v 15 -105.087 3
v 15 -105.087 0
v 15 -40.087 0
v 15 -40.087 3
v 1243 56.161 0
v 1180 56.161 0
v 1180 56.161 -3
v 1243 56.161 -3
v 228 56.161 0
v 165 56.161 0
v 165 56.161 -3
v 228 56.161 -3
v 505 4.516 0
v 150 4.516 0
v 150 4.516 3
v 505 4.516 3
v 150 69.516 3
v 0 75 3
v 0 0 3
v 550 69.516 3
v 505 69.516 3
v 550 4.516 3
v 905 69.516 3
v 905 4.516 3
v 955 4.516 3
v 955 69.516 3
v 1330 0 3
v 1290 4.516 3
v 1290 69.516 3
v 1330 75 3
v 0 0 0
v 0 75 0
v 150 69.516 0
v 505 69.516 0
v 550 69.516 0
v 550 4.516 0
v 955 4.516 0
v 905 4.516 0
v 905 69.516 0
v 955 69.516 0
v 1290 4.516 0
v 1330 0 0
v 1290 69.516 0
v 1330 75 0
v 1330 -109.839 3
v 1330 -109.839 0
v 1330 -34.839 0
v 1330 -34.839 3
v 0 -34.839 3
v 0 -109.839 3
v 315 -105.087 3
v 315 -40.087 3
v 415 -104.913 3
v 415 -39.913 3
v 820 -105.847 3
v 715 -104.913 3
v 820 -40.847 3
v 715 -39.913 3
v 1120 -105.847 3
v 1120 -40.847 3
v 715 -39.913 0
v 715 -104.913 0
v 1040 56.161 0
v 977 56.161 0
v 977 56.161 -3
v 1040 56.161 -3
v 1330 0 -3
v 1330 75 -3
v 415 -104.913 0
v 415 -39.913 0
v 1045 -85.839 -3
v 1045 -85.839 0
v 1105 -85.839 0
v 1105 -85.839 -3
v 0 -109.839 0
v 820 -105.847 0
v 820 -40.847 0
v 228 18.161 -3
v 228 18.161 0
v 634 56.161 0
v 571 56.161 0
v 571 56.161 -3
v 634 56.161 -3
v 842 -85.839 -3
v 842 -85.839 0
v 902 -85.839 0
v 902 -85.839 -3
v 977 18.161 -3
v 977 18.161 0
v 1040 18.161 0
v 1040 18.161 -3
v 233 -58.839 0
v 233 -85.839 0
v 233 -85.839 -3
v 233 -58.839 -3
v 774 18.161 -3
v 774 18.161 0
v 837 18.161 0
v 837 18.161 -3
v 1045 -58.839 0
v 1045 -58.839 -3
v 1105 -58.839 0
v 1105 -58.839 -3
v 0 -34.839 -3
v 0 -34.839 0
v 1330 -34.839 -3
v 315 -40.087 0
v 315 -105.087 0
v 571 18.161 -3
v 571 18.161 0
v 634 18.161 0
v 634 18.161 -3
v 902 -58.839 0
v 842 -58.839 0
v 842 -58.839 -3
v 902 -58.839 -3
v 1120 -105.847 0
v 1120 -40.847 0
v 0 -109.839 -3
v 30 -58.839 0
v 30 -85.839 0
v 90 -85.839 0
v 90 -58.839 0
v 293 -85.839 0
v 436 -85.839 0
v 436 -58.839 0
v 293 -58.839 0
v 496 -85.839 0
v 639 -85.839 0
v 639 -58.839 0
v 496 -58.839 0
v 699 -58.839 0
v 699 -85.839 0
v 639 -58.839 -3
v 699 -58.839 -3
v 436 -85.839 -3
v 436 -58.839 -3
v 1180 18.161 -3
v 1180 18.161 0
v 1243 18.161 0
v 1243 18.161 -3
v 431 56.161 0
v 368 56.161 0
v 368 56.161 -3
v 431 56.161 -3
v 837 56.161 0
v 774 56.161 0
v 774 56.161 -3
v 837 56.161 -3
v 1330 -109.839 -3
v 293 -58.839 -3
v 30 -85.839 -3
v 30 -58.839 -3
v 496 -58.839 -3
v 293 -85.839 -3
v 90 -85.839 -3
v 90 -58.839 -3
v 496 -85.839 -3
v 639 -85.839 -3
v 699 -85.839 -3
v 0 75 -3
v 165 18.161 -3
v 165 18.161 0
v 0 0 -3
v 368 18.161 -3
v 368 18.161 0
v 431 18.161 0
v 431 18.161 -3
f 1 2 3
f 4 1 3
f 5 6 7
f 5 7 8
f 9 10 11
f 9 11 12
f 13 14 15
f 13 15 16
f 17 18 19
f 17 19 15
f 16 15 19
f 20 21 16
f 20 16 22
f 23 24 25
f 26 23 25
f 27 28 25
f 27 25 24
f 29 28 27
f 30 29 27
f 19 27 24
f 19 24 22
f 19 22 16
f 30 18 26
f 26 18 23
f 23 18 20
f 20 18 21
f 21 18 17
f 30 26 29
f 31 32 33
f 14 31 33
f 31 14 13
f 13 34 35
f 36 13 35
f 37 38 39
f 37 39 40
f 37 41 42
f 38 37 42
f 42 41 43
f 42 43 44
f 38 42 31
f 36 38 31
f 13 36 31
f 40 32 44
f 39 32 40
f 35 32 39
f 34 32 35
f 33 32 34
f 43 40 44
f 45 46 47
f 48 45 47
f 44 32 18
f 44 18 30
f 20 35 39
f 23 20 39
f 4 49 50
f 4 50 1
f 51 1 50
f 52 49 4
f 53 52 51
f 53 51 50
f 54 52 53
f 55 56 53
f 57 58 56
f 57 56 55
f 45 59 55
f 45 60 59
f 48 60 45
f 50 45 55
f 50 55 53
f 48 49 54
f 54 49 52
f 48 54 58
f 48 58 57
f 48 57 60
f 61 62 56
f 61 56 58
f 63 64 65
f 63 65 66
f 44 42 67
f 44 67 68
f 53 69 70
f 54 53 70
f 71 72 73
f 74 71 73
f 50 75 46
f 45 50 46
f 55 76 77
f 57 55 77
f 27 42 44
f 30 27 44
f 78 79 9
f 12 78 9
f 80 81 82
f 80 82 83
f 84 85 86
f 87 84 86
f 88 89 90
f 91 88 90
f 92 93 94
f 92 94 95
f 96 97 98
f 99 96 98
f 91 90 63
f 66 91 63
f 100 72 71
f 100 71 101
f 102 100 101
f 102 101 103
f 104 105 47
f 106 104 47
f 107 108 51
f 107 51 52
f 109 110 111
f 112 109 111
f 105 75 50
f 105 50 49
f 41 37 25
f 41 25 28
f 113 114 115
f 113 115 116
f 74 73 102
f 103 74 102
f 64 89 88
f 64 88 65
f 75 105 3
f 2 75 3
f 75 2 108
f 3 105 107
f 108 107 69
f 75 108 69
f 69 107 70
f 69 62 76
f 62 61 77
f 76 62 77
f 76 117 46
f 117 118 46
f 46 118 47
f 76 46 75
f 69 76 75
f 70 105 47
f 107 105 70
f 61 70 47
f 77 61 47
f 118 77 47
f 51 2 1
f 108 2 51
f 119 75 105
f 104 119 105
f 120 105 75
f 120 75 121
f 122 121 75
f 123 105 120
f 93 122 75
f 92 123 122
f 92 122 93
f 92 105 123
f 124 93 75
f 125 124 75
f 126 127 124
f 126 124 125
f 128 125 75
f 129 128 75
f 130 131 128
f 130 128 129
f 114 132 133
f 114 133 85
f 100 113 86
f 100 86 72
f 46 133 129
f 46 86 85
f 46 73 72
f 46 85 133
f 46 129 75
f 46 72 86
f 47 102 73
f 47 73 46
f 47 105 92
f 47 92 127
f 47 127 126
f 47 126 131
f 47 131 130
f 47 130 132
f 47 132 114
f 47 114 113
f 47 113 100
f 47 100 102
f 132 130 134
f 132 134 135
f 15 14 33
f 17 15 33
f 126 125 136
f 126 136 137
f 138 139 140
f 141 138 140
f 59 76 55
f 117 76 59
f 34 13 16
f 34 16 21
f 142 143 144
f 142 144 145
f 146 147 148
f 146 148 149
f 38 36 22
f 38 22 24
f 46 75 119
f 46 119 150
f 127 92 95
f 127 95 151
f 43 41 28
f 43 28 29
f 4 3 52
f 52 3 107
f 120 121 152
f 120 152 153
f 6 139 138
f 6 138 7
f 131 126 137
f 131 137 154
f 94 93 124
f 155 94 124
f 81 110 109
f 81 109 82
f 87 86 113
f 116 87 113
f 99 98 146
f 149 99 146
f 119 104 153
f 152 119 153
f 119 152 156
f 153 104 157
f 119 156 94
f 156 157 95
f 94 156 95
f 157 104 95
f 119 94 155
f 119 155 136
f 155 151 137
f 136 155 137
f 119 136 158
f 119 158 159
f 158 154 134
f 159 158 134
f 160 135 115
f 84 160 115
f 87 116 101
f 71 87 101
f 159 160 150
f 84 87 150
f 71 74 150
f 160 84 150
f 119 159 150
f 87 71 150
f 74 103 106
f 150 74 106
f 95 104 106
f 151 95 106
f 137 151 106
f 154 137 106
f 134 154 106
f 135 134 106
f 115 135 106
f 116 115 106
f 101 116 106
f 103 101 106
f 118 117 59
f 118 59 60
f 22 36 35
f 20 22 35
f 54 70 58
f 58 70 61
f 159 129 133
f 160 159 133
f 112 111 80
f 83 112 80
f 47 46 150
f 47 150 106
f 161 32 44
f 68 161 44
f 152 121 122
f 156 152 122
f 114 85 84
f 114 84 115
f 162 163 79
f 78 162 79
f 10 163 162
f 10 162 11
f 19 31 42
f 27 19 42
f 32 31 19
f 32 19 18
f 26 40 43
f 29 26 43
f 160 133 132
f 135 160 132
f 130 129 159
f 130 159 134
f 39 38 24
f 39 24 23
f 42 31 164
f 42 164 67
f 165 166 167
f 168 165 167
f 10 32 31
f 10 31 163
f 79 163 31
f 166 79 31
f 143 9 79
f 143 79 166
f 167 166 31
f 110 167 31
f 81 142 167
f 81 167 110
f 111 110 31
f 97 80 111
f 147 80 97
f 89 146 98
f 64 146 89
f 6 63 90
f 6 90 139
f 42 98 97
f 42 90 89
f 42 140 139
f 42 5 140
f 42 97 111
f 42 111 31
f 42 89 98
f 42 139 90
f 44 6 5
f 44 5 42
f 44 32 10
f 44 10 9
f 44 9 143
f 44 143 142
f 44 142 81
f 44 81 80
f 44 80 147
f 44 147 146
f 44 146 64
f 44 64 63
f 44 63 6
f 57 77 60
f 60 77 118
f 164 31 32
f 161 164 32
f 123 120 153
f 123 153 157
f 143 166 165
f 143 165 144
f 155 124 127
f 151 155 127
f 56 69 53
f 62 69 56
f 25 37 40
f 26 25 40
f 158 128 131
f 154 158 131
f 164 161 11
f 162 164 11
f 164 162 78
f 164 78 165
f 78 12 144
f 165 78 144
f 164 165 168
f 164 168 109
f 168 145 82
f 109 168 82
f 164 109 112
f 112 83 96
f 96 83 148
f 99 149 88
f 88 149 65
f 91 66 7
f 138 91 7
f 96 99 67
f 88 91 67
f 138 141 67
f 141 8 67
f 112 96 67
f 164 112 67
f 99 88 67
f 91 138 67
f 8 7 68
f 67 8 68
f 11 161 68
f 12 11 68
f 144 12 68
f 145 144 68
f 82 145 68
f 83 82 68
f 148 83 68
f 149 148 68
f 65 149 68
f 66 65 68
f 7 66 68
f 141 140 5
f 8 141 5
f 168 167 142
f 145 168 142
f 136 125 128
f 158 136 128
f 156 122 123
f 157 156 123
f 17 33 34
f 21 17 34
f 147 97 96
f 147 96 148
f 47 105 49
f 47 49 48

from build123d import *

# Parameters (mm, degrees)
F0_W     = 1330
F0_H     = 75
F0_W_2   = 355
F0_H_2   = 65
F0_W_3   = 335
F0_W_4   = 300
F2_DEPTH = 3
F1_W     = 1330
F1_H     = 75
F1_W_2   = 63
F1_H_2   = 38
F1_W_3   = 60
F1_H_3   = 27
F3_DEPTH = 3


with BuildPart() as f2:
    # F0 (on Top) → F2 (new body)
    with BuildSketch(Plane.XY):
        with Locations((665, 37.5)):
            Rectangle(F0_W, F0_H)
        with Locations((327.5, 37.015805)):
            Rectangle(F0_W_2, F0_H_2, mode=Mode.SUBTRACT)
        with Locations((727.5, 37.015794)):
            Rectangle(F0_W_2, F0_H_2, mode=Mode.SUBTRACT)
        with Locations((1122.5, 37.015812)):
            Rectangle(F0_W_3, F0_H_2, mode=Mode.SUBTRACT)
        with Locations((665, -72.338669)):
            Rectangle(F0_W, F0_H)
        with Locations((165, -72.586558)):
            Rectangle(F0_W_4, F0_H_2, mode=Mode.SUBTRACT)
        with Locations((565, -72.413251)):
            Rectangle(F0_W_4, F0_H_2, mode=Mode.SUBTRACT)
        with Locations((970, -73.346786)):
            Rectangle(F0_W_4, F0_H_2, mode=Mode.SUBTRACT)
    extrude(amount=F2_DEPTH)


with BuildPart() as f3:
    # F1 (on Top) → F3 (new body)
    with BuildSketch(Plane.XY):
        with Locations((665, 37.5)):
            Rectangle(F1_W, F1_H)
        with Locations((196.5, 37.161331)):
            Rectangle(F1_W_2, F1_H_2, mode=Mode.SUBTRACT)
        with Locations((399.5, 37.161331)):
            Rectangle(F1_W_2, F1_H_2, mode=Mode.SUBTRACT)
        with Locations((602.5, 37.161331)):
            Rectangle(F1_W_2, F1_H_2, mode=Mode.SUBTRACT)
        with Locations((805.5, 37.161331)):
            Rectangle(F1_W_2, F1_H_2, mode=Mode.SUBTRACT)
        with Locations((1008.5, 37.161331)):
            Rectangle(F1_W_2, F1_H_2, mode=Mode.SUBTRACT)
        with Locations((1211.5, 37.161331)):
            Rectangle(F1_W_2, F1_H_2, mode=Mode.SUBTRACT)
        with Locations((665, -72.338669)):
            Rectangle(F1_W, F1_H)
        with Locations((60, -72.338669)):
            Rectangle(F1_W_3, F1_H_3, mode=Mode.SUBTRACT)
        with Locations((263, -72.338669)):
            Rectangle(F1_W_3, F1_H_3, mode=Mode.SUBTRACT)
        with Locations((466, -72.338669)):
            Rectangle(F1_W_3, F1_H_3, mode=Mode.SUBTRACT)
        with Locations((669, -72.338669)):
            Rectangle(F1_W_3, F1_H_3, mode=Mode.SUBTRACT)
        with Locations((872, -72.338669)):
            Rectangle(F1_W_3, F1_H_3, mode=Mode.SUBTRACT)
        with Locations((1075, -72.338669)):
            Rectangle(F1_W_3, F1_H_3, mode=Mode.SUBTRACT)
    extrude(amount=-F3_DEPTH)


solid = Compound([f2.part, f3.part])
